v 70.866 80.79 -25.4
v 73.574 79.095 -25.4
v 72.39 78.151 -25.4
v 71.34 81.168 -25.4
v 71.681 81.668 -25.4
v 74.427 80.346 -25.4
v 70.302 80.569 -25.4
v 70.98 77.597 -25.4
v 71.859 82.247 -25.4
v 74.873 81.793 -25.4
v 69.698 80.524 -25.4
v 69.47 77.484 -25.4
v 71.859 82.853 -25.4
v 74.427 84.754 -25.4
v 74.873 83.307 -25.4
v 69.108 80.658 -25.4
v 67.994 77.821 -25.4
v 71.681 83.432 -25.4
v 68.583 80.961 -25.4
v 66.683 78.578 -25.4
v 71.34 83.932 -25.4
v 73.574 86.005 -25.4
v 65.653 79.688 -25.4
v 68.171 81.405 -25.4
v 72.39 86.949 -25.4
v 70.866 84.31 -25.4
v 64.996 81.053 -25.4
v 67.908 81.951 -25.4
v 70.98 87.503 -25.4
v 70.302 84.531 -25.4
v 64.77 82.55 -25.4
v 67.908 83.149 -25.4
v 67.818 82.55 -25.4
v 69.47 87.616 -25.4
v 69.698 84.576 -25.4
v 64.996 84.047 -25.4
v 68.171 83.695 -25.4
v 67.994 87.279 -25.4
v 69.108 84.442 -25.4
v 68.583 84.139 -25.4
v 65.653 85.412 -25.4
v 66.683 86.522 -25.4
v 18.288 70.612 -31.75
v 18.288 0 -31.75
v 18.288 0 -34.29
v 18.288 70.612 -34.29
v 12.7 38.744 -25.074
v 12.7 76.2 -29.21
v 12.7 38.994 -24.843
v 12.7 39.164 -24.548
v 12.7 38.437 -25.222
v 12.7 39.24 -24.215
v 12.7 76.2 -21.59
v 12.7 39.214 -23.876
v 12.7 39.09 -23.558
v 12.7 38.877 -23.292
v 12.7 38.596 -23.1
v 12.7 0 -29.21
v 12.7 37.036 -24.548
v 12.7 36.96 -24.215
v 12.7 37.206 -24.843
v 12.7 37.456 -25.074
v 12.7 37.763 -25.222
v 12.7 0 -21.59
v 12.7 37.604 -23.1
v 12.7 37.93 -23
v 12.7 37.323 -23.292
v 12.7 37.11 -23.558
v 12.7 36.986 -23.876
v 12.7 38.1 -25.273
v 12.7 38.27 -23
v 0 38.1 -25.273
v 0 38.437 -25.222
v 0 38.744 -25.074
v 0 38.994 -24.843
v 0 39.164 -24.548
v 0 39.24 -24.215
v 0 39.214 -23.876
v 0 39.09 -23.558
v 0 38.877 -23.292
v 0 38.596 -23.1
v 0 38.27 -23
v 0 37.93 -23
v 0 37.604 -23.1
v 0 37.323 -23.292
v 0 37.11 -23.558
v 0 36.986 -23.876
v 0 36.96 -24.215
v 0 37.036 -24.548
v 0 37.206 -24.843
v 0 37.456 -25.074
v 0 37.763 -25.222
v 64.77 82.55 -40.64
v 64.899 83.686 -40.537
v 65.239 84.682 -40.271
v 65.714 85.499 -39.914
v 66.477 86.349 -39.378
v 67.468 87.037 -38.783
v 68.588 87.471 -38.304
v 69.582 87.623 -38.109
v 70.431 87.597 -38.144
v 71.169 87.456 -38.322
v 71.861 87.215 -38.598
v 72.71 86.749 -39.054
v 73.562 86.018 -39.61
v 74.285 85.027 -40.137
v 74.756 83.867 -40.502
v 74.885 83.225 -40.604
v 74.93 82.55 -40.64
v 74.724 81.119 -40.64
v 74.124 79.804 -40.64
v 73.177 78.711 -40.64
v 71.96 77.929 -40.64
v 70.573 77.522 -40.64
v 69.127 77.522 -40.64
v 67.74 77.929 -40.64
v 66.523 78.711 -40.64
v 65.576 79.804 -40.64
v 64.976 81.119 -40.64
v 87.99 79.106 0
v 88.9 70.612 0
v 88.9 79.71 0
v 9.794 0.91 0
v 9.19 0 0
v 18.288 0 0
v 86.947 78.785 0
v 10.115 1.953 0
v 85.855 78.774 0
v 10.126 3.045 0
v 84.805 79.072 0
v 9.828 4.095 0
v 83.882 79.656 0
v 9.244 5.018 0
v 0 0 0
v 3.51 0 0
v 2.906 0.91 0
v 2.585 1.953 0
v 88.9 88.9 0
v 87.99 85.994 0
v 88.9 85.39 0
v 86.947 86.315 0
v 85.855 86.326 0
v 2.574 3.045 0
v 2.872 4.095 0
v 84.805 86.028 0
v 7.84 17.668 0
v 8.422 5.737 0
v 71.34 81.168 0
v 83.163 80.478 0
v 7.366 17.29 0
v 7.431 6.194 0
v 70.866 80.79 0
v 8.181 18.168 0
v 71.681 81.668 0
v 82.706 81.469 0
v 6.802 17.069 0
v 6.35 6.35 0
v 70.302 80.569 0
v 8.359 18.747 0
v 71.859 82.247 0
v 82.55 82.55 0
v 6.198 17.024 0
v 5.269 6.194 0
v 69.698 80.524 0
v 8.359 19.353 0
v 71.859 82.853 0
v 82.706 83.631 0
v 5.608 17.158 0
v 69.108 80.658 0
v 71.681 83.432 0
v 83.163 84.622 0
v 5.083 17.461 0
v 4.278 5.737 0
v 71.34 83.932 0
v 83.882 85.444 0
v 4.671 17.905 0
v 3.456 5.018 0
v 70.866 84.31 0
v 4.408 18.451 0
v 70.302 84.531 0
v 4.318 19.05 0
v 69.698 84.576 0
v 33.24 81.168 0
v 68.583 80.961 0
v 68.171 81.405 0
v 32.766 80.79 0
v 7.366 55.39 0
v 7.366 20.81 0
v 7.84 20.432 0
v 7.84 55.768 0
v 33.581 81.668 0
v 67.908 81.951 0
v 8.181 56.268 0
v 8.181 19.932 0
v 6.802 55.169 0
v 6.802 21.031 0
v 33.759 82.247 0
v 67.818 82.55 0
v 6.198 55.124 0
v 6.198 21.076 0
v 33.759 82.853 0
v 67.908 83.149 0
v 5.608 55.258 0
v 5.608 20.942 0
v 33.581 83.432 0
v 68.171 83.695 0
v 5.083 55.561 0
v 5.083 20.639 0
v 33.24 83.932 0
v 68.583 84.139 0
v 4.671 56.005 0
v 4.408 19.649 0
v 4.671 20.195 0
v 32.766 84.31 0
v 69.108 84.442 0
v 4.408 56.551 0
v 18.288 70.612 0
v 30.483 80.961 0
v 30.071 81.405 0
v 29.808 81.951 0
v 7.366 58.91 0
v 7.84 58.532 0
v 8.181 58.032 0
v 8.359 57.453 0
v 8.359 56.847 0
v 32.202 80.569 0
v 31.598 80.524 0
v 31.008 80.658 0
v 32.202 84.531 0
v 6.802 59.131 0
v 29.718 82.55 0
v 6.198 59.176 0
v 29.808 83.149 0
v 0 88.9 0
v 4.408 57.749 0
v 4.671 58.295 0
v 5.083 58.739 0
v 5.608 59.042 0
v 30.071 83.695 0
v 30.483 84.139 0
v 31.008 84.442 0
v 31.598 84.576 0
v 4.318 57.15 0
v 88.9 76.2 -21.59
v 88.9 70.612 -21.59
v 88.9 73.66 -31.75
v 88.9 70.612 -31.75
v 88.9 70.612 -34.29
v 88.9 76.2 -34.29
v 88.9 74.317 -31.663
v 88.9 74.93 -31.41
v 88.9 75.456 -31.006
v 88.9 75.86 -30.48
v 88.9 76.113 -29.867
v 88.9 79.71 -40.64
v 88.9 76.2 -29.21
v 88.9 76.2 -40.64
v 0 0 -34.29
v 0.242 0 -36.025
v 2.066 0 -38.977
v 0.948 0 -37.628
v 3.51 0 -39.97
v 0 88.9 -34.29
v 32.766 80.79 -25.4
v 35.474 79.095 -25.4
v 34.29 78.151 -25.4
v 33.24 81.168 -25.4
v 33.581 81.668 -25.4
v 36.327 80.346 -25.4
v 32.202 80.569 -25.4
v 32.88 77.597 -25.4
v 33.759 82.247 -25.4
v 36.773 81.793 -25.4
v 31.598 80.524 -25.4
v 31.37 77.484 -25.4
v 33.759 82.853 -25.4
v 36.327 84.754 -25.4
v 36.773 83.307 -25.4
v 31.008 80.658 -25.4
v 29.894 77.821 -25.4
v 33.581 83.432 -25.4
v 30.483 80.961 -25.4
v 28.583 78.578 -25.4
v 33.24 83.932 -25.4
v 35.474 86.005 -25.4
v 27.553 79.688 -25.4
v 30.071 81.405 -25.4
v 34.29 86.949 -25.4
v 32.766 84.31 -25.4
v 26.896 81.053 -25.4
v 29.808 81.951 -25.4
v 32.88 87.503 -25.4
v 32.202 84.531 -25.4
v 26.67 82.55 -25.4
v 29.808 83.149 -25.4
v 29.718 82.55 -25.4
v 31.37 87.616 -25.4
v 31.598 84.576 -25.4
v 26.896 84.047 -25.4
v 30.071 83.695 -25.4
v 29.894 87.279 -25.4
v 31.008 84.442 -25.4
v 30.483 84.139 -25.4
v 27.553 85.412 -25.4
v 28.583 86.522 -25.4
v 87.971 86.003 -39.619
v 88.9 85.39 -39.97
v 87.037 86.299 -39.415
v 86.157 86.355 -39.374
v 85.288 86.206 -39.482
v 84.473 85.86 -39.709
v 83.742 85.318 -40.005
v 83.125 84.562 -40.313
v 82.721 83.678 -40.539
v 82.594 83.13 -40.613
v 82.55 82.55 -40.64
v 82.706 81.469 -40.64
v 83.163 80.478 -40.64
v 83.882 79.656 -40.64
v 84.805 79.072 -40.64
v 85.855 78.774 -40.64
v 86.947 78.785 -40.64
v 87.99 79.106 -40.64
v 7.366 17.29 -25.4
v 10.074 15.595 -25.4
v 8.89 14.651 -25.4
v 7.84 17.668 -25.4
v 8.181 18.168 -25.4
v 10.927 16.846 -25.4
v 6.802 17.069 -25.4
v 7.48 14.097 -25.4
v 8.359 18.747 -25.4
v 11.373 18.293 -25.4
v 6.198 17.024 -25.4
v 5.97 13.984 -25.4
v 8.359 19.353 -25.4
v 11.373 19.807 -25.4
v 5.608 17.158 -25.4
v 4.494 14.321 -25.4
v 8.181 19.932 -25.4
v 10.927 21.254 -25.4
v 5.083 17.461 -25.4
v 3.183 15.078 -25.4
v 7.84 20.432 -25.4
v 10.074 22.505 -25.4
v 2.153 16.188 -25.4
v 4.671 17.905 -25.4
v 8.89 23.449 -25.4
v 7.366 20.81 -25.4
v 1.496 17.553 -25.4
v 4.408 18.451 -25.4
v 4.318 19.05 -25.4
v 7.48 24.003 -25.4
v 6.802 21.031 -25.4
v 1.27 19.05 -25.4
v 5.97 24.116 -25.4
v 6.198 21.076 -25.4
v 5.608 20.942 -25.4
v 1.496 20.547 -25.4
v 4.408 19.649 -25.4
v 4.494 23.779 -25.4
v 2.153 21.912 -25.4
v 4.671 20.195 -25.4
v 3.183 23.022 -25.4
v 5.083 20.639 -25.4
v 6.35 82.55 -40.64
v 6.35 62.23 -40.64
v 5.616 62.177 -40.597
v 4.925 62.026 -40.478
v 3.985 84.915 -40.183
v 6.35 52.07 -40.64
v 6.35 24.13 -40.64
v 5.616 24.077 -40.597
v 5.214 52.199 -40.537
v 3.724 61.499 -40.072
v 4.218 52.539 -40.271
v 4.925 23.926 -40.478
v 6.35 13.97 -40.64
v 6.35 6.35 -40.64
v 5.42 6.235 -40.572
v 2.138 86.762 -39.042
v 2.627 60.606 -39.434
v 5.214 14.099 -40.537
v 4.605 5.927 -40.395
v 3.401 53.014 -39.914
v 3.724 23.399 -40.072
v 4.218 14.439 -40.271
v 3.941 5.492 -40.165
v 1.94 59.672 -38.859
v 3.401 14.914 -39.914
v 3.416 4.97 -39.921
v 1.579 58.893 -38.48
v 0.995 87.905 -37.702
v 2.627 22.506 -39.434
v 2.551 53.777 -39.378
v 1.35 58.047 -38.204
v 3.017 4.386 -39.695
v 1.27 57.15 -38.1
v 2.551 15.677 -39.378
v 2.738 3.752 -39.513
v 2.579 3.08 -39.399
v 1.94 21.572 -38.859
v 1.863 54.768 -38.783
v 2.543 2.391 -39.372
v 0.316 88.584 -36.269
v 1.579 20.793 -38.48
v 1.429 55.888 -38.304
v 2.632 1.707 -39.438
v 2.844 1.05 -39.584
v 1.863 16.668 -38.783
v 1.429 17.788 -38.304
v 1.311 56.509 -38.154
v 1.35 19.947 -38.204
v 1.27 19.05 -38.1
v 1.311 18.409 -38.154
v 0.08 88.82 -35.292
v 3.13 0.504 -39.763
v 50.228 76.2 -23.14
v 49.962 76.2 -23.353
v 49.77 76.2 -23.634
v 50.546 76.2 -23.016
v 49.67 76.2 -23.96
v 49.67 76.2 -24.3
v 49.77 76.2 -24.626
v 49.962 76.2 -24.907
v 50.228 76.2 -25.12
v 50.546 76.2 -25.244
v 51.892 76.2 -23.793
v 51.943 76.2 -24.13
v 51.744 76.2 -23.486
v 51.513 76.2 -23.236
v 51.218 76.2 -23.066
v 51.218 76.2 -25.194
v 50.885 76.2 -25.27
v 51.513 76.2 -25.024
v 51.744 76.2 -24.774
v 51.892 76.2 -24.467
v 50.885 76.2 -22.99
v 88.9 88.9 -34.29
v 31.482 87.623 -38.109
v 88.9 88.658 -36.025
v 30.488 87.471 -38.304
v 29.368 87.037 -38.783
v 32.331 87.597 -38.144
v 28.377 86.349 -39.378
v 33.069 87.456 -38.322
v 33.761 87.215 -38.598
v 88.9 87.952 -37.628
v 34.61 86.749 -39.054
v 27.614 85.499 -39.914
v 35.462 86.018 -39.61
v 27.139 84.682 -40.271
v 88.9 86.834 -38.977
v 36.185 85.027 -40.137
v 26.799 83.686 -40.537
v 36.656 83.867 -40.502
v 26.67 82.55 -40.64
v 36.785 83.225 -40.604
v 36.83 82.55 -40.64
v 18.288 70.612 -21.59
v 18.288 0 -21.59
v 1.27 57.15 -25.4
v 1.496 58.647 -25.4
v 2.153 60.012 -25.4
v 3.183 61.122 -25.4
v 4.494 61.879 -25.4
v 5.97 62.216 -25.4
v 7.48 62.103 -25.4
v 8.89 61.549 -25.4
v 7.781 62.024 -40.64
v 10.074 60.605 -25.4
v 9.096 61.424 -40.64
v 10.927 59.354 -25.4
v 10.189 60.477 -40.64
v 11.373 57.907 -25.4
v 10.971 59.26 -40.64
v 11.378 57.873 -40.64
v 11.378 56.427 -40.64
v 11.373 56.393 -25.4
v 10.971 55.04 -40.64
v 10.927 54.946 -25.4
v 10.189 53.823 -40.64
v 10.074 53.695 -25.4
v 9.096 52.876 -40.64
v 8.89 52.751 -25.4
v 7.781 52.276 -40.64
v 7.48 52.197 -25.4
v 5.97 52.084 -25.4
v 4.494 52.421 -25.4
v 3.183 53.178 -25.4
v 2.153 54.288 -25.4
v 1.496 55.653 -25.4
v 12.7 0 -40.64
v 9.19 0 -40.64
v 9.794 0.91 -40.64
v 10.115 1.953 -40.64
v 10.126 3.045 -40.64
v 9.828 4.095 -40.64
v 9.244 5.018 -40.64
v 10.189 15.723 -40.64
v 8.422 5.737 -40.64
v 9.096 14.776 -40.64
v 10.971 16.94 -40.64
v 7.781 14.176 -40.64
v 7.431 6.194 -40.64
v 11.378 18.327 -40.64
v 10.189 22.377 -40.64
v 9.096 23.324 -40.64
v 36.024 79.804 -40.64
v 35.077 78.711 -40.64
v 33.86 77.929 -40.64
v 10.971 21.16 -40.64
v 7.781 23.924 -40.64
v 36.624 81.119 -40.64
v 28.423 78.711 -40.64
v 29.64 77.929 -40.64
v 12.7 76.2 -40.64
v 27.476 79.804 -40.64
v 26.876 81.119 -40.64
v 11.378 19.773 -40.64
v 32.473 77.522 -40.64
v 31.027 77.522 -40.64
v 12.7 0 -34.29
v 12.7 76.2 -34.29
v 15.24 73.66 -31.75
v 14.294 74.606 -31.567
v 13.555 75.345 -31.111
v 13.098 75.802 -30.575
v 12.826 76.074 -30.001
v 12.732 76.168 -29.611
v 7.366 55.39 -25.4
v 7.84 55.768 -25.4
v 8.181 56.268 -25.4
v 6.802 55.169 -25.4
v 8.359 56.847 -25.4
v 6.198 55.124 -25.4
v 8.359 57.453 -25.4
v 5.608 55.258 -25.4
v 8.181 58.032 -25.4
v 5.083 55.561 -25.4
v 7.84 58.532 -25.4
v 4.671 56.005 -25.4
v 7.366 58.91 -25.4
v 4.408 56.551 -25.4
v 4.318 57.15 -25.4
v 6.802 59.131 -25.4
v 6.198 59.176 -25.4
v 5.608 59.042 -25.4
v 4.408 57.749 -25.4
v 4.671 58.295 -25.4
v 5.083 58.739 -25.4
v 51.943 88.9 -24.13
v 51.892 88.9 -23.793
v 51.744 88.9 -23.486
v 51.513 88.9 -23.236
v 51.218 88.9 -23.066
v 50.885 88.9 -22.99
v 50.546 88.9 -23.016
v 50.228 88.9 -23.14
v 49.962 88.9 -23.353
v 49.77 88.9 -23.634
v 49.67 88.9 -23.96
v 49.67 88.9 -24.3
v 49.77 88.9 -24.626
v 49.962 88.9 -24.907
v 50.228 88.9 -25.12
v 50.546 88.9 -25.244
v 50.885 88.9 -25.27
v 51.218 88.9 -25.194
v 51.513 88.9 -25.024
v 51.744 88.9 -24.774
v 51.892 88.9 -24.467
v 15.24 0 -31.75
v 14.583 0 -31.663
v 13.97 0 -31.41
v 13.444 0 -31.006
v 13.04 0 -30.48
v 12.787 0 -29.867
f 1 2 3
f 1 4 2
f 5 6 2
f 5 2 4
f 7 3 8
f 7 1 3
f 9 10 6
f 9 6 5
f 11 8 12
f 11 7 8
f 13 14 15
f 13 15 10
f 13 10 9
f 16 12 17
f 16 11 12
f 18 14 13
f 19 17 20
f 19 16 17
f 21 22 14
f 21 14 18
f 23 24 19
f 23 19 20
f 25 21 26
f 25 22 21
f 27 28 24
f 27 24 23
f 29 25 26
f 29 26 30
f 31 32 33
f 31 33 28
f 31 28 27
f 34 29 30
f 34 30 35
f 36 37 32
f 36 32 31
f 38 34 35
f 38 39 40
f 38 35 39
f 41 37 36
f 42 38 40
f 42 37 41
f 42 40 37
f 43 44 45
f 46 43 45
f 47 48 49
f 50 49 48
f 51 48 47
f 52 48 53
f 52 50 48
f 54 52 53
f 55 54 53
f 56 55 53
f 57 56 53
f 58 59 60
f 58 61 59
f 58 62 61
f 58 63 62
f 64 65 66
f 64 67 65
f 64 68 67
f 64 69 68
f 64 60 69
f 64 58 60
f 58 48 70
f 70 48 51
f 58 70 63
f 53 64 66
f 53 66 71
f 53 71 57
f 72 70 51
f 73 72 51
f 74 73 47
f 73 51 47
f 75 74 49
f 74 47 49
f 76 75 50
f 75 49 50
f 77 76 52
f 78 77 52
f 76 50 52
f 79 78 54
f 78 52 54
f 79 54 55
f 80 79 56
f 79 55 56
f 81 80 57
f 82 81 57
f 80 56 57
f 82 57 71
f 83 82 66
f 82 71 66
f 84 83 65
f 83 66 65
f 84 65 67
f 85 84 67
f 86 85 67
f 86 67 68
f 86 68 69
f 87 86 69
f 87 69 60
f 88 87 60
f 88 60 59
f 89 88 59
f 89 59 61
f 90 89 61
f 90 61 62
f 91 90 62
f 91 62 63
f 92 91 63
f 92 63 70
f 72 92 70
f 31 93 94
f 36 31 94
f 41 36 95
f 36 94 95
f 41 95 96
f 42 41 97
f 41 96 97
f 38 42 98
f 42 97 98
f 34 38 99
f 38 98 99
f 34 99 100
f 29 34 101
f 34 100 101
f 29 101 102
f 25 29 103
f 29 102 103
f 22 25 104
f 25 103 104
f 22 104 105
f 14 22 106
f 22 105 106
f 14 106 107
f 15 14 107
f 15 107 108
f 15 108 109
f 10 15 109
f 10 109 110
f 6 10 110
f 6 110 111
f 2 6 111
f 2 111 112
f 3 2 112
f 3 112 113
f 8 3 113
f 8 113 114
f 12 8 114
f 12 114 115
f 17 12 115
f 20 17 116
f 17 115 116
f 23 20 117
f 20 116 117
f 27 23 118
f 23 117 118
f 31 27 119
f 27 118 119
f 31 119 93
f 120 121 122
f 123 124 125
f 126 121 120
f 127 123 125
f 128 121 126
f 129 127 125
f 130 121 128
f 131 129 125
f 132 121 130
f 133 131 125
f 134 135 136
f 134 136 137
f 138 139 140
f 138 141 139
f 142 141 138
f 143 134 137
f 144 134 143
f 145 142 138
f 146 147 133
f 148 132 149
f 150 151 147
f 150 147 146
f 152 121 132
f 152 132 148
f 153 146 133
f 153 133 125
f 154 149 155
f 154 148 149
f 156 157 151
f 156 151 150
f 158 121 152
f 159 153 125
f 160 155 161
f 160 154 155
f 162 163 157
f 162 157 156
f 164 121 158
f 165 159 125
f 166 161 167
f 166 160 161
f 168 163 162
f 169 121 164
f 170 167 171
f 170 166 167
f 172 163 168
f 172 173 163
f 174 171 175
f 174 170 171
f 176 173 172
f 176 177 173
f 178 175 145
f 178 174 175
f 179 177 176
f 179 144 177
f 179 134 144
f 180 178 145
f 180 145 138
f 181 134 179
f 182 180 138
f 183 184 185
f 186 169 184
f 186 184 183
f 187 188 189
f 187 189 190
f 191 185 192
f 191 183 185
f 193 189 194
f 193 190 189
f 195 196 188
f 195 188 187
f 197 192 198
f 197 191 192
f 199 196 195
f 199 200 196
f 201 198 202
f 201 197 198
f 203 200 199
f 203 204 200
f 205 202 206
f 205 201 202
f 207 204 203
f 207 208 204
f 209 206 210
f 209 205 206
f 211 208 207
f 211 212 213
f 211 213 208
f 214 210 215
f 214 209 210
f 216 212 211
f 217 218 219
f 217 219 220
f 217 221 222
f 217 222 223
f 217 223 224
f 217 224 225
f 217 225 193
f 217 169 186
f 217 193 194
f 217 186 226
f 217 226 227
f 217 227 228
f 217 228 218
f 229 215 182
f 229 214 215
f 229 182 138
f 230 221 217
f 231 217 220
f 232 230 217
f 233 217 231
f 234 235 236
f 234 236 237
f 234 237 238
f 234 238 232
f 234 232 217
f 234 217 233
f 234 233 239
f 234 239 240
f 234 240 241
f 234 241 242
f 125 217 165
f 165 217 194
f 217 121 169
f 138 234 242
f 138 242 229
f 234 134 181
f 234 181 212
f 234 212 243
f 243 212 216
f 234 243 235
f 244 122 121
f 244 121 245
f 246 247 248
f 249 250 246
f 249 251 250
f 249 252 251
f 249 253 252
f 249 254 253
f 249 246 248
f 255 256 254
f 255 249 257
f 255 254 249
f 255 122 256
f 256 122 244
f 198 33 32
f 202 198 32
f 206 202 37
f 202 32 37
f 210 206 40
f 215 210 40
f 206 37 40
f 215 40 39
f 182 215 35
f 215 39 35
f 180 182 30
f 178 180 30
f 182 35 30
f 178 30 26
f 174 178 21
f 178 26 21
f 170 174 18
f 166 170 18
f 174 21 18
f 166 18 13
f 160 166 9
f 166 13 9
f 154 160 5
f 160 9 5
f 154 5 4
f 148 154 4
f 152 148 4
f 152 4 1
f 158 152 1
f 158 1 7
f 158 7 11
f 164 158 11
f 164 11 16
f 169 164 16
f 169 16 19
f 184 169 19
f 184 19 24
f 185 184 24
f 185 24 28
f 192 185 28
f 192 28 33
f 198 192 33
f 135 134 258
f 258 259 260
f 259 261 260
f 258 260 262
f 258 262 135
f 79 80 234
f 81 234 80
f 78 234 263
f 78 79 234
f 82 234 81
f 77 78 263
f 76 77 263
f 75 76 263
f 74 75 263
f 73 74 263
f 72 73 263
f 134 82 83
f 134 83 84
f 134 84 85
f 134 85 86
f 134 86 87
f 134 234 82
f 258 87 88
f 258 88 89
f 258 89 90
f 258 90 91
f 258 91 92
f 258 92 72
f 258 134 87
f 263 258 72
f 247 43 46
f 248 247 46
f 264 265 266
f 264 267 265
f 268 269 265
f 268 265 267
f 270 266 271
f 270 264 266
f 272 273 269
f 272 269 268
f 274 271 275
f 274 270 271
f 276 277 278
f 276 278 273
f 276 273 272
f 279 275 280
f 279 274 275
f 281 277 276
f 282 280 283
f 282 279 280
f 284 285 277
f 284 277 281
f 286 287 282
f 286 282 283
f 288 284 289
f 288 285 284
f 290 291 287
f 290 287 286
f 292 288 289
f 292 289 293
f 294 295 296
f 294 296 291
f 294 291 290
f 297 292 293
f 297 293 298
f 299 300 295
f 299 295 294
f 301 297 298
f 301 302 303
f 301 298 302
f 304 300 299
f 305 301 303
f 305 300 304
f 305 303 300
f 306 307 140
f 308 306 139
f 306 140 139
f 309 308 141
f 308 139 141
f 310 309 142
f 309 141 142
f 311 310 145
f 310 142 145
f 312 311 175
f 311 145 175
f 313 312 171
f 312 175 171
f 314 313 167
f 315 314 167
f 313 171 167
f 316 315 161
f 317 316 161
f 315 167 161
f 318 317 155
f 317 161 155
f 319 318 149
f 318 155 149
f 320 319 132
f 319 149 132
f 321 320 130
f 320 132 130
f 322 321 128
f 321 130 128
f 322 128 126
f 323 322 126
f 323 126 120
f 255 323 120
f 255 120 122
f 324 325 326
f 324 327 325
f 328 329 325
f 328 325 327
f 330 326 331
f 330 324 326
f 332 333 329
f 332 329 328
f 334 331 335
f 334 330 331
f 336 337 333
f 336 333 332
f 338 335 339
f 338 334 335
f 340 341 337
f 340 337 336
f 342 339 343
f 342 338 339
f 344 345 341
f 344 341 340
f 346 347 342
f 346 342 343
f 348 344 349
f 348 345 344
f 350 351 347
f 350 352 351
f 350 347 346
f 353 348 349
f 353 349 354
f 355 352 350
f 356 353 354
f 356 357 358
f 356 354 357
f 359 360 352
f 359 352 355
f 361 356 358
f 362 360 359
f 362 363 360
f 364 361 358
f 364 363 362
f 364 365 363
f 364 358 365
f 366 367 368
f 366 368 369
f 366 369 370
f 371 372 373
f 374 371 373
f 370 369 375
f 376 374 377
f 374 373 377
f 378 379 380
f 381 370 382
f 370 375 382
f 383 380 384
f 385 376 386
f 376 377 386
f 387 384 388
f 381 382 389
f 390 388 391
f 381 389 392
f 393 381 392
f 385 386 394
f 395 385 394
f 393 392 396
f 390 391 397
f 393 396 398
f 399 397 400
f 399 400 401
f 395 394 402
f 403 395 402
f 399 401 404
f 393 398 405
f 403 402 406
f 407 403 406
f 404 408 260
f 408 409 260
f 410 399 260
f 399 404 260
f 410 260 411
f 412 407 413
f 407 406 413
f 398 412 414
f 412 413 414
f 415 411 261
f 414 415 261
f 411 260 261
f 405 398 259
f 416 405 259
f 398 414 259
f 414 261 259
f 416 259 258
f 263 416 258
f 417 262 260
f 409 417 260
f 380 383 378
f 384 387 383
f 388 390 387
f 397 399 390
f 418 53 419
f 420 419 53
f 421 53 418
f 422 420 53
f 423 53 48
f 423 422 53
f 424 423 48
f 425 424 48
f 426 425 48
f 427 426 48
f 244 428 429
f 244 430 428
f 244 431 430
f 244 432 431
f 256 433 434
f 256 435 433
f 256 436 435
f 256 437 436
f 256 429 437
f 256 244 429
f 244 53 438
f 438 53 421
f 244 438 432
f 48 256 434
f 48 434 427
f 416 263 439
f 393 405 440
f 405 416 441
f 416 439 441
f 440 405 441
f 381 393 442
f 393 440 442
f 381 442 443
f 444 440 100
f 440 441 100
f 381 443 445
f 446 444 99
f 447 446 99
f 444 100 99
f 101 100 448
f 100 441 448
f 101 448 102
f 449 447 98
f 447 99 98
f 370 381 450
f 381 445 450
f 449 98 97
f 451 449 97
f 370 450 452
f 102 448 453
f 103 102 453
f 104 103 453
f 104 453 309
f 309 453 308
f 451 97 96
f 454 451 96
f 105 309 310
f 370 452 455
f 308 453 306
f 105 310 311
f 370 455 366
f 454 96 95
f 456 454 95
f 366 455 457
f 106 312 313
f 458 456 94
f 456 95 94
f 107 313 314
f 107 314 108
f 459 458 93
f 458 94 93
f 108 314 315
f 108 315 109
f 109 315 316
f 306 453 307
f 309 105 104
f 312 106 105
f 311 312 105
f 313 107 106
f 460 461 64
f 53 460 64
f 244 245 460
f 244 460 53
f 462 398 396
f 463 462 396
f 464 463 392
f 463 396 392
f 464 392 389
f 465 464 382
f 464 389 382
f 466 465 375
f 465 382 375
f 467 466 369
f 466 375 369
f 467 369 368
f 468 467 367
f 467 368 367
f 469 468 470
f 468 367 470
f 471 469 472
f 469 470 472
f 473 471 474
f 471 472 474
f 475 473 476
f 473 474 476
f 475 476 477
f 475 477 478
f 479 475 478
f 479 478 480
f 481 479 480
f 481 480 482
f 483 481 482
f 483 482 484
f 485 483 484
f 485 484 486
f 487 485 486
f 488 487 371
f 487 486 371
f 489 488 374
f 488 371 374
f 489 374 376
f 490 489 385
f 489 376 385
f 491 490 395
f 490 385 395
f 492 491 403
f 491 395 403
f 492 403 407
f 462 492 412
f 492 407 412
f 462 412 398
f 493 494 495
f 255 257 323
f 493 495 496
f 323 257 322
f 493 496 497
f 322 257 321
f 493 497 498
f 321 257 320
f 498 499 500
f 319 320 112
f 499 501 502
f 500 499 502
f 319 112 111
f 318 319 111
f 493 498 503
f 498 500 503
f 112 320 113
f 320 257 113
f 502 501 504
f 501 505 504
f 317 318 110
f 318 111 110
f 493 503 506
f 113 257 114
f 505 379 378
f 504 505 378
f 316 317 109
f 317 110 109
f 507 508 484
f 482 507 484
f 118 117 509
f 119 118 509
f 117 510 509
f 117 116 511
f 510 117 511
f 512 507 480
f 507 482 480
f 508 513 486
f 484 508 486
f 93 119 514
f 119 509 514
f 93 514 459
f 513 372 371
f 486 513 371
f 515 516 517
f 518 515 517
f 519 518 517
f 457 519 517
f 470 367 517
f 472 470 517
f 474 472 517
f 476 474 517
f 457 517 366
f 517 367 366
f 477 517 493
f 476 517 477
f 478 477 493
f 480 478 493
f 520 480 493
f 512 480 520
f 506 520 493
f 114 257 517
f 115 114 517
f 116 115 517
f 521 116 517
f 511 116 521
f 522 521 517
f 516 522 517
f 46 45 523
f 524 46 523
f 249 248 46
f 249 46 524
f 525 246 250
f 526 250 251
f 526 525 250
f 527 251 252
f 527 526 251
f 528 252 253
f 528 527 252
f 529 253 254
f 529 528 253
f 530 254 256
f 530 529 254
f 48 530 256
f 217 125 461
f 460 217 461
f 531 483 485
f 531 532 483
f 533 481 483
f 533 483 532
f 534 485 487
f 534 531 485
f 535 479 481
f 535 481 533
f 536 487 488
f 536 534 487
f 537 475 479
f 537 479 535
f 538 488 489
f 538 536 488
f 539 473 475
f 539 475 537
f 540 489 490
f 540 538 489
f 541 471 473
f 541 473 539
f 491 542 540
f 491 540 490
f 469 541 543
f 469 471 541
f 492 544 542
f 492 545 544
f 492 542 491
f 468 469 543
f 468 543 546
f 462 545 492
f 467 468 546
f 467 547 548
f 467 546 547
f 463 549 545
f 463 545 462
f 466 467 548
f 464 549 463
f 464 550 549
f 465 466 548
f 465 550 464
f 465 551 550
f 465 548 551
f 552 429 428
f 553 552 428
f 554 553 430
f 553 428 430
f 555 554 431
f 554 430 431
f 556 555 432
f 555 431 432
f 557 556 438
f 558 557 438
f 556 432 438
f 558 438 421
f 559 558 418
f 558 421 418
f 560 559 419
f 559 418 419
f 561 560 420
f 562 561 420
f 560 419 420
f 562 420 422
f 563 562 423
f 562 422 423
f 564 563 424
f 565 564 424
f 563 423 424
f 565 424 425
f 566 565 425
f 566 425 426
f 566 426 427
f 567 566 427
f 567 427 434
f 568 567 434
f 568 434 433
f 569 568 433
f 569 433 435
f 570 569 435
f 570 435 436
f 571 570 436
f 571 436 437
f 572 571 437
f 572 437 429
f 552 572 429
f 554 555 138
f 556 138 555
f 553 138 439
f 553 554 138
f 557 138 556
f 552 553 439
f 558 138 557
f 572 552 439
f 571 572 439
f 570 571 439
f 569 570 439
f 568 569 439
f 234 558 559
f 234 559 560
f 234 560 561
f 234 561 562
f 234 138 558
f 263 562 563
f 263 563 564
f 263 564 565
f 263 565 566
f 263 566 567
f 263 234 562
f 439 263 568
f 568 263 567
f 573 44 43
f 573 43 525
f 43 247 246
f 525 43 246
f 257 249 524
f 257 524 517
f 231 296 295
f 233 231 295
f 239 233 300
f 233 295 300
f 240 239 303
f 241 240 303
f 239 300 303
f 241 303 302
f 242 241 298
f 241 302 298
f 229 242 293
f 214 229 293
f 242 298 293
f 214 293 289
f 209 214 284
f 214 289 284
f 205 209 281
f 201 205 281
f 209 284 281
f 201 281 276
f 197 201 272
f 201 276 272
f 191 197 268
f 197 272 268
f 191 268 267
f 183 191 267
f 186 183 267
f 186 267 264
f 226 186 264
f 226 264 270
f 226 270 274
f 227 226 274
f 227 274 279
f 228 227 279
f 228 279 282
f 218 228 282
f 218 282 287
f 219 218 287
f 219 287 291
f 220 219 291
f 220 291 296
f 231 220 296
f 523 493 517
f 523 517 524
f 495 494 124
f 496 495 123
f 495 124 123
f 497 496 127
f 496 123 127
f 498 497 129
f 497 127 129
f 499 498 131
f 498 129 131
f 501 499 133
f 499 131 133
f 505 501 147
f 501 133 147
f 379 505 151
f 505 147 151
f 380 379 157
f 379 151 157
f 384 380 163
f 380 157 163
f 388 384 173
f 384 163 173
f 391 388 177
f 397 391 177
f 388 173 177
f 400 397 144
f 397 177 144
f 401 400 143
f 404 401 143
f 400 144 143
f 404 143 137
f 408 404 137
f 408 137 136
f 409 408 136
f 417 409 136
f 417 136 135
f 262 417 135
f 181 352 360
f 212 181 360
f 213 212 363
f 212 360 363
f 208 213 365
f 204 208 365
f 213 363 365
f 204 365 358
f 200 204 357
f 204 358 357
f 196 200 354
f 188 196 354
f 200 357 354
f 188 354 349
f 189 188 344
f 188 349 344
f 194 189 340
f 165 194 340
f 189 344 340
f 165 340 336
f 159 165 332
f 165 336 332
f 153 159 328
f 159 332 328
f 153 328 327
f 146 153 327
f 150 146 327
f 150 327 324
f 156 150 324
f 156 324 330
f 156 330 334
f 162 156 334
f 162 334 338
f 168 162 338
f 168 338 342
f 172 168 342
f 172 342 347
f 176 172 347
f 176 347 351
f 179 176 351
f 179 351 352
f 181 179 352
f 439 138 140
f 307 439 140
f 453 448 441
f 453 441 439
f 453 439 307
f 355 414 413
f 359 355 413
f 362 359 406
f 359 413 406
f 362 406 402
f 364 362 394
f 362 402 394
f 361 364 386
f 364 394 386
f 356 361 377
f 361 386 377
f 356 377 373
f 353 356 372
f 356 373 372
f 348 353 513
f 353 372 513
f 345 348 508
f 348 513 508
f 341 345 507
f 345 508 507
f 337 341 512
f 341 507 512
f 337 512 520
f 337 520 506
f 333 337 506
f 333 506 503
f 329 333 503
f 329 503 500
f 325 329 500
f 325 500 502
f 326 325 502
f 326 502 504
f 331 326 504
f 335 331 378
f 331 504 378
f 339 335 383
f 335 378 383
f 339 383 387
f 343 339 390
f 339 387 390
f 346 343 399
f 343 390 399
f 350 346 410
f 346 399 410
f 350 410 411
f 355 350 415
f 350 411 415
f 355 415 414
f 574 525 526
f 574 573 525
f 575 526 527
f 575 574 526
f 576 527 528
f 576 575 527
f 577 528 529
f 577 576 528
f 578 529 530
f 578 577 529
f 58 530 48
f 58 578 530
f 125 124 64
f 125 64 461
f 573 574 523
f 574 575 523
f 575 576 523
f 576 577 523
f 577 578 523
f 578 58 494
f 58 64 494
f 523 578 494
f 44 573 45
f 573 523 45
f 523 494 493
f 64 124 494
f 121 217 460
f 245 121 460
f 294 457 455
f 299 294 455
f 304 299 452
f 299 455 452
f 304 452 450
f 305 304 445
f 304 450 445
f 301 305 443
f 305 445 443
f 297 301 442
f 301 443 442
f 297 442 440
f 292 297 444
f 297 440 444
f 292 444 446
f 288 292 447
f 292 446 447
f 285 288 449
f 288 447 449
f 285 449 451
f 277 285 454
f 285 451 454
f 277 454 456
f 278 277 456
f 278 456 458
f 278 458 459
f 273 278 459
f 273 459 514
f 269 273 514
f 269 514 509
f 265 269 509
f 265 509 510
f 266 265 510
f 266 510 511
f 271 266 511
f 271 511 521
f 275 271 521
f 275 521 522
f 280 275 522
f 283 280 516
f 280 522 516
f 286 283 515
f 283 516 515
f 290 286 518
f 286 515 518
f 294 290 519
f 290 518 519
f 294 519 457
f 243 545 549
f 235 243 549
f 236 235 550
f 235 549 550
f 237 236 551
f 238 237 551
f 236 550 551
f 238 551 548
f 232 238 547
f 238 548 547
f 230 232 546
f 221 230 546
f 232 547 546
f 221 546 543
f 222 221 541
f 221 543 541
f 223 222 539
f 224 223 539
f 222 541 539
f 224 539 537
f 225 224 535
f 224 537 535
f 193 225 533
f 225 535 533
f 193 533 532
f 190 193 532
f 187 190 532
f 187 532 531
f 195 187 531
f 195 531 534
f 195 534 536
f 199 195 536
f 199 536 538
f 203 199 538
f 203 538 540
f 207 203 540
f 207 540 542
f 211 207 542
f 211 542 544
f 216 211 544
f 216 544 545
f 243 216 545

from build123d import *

# Parameters (mm, degrees)
SKETCH2_W           = 18.288
SKETCH2_H           = 40.64
BOSS_EXTRUDE1_DEPTH = 88.9
SKETCH3_W           = 40.64
SKETCH3_H           = 18.288
BOSS_EXTRUDE2_DEPTH = 70.612
SKETCH4_W           = 6.35
SKETCH4_H           = 5.588
SKETCH4_W_2         = 10.16
CUT_EXTRUDE1_DEPTH  = 76.2
SKETCH5_W           = 5.588
SKETCH5_H           = 6.35
SKETCH5_H_2         = 10.16
CUT_EXTRUDE2_DEPTH  = 76.2
SKETCH6_R           = 5.08
CUT_EXTRUDE3_DEPTH  = 15.24
SKETCH7_R           = 2.032
CUT_EXTRUDE4_DEPTH  = 133.128837125
FILLET1_R           = 2.54
FILLET2_R           = 6.35
SKETCH8_R           = 3.81
CUT_EXTRUDE5_DEPTH  = 133.12883729
CUT_EXTRUDE6_REACH  = 125.941
SKETCH9_R           = 1.143
CUT_EXTRUDE7_REACH  = 125.941
SKETCH10_R          = 1.143


with BuildPart() as part:
    # Sketch2 → Boss-Extrude1 (new body)
    with BuildSketch(Plane(origin=(0, 0, 0), x_dir=(1, 0, 0), z_dir=(0, 1, 0))):
        with Locations((9.144, 20.32)):
            Rectangle(SKETCH2_W, SKETCH2_H)
    extrude(amount=BOSS_EXTRUDE1_DEPTH)

    # Sketch3 → Boss-Extrude2 (add)
    with BuildSketch(Plane(origin=(18.288, 0, 0), x_dir=(0, 0, -1), z_dir=(1, 0, 0))):
        with Locations((20.32, 79.756)):
            Rectangle(SKETCH3_W, SKETCH3_H)
    extrude(amount=BOSS_EXTRUDE2_DEPTH)

    # Sketch4 → Cut-Extrude1 (cut)
    with BuildSketch(Plane(origin=(88.9, 0, 0), x_dir=(0, 0, -1), z_dir=(1, 0, 0))):
        with Locations((37.465, 73.406)):
            Rectangle(SKETCH4_W, SKETCH4_H)
        with Locations((26.67, 73.406)):
            Rectangle(SKETCH4_W_2, SKETCH4_H)
    extrude(amount=-CUT_EXTRUDE1_DEPTH, mode=Mode.SUBTRACT)

    # Sketch5 → Cut-Extrude2 (cut)
    with BuildSketch(Plane.XZ):
        with Locations((15.494, -37.465)):
            Rectangle(SKETCH5_W, SKETCH5_H)
        with Locations((15.494, -26.67)):
            Rectangle(SKETCH5_W, SKETCH5_H_2)
    extrude(amount=-CUT_EXTRUDE2_DEPTH, mode=Mode.SUBTRACT)

    # Sketch6 → Cut-Extrude3 (cut)
    with BuildSketch(Plane(origin=(0, 0, -40.64), x_dir=(-1, 0, 0), z_dir=(0, 0, -1))):
        with Locations((-6.35, 19.05)):
            Circle(SKETCH6_R)
        with Locations((-6.35, 57.15)):
            Circle(SKETCH6_R)
        with Locations((-31.75, 82.55)):
            Circle(SKETCH6_R)
        with Locations((-69.85, 82.55)):
            Circle(SKETCH6_R)
    extrude(amount=-CUT_EXTRUDE3_DEPTH, mode=Mode.SUBTRACT)

    # Sketch7 → Cut-Extrude4 (cut, through all)
    with BuildSketch(Plane(origin=(0, 0, -40.64), x_dir=(-1, 0, 0), z_dir=(0, 0, -1))):
        with Locations((-69.85, 82.55)):
            Circle(SKETCH7_R)
        with Locations((-6.35, 57.15)):
            Circle(SKETCH7_R)
        with Locations((-31.75, 82.55)):
            Circle(SKETCH7_R)
        with Locations((-6.35, 19.05)):
            Circle(SKETCH7_R)
    extrude(amount=-CUT_EXTRUDE4_DEPTH, mode=Mode.SUBTRACT)

    # Fillet1
    fillet1_edges = [part.edges().sort_by_distance(p)[0] for p in [
        (12.7, 38.1, -31.75),
        (50.8, 76.2, -31.75),
    ]]
    fillet(fillet1_edges, radius=FILLET1_R)

    # Fillet2
    # the kernel refuses this fillet: 6.35 mm, written as the material it takes off along each edge
    with BuildSketch(Plane(origin=(104.775, 88.9, -40.64), x_dir=(0, -1, 0), z_dir=(-1, 0, 0))) as fillet2_piece_1:
        with BuildLine():
            CenterArc((FILLET2_R, FILLET2_R), FILLET2_R, 180, 90)
            Line((0, FILLET2_R), (0, 0))
            Line((0, 0), (FILLET2_R, 0))
        make_face()
    extrude(amount=120.65, mode=Mode.SUBTRACT)
    with BuildSketch(Plane(origin=(0, -15.875, -40.64), x_dir=(1, 0, 0), z_dir=(0, 1, 0))) as fillet2_piece_2:
        with BuildLine():
            CenterArc((FILLET2_R, -FILLET2_R), FILLET2_R, 90, 90)
            Line((0, -FILLET2_R), (0, 0))
            Line((0, 0), (FILLET2_R, 0))
        make_face()
    extrude(amount=120.65, mode=Mode.SUBTRACT)

    # Sketch8 → Cut-Extrude5 (cut, through all)
    with BuildSketch(Plane.XY):
        with Locations((6.35, 2.54)):
            Circle(SKETCH8_R)
        with Locations((86.36, 82.55)):
            Circle(SKETCH8_R)
    extrude(amount=-CUT_EXTRUDE5_DEPTH, mode=Mode.SUBTRACT)

    # Sketch9 → Cut-Extrude6 (cut, up to next)
    with BuildSketch(Plane.XZ.offset(-76.2), mode=Mode.PRIVATE) as cut_extrude6_sk1:
        with Locations((50.8, -24.13)):
            Circle(SKETCH9_R)
    cut_extrude6_tool1 = extrude(cut_extrude6_sk1.sketch, amount=-CUT_EXTRUDE6_REACH, mode=Mode.PRIVATE) & part.part
    add(cut_extrude6_tool1.solids().sort_by_distance((50.8, 76.2, -24.13))[0], mode=Mode.SUBTRACT)

    # Sketch10 → Cut-Extrude7 (cut, up to next)
    with BuildSketch(Plane(origin=(12.7, 0, 0), x_dir=(0, 0, -1), z_dir=(1, 0, 0)), mode=Mode.PRIVATE) as cut_extrude7_sk1:
        with Locations((24.13, 38.1)):
            Circle(SKETCH10_R)
    cut_extrude7_tool1 = extrude(cut_extrude7_sk1.sketch, amount=-CUT_EXTRUDE7_REACH, mode=Mode.PRIVATE) & part.part
    add(cut_extrude7_tool1.solids().sort_by_distance((12.7, 38.1, -24.13))[0], mode=Mode.SUBTRACT)


solid = part.part
